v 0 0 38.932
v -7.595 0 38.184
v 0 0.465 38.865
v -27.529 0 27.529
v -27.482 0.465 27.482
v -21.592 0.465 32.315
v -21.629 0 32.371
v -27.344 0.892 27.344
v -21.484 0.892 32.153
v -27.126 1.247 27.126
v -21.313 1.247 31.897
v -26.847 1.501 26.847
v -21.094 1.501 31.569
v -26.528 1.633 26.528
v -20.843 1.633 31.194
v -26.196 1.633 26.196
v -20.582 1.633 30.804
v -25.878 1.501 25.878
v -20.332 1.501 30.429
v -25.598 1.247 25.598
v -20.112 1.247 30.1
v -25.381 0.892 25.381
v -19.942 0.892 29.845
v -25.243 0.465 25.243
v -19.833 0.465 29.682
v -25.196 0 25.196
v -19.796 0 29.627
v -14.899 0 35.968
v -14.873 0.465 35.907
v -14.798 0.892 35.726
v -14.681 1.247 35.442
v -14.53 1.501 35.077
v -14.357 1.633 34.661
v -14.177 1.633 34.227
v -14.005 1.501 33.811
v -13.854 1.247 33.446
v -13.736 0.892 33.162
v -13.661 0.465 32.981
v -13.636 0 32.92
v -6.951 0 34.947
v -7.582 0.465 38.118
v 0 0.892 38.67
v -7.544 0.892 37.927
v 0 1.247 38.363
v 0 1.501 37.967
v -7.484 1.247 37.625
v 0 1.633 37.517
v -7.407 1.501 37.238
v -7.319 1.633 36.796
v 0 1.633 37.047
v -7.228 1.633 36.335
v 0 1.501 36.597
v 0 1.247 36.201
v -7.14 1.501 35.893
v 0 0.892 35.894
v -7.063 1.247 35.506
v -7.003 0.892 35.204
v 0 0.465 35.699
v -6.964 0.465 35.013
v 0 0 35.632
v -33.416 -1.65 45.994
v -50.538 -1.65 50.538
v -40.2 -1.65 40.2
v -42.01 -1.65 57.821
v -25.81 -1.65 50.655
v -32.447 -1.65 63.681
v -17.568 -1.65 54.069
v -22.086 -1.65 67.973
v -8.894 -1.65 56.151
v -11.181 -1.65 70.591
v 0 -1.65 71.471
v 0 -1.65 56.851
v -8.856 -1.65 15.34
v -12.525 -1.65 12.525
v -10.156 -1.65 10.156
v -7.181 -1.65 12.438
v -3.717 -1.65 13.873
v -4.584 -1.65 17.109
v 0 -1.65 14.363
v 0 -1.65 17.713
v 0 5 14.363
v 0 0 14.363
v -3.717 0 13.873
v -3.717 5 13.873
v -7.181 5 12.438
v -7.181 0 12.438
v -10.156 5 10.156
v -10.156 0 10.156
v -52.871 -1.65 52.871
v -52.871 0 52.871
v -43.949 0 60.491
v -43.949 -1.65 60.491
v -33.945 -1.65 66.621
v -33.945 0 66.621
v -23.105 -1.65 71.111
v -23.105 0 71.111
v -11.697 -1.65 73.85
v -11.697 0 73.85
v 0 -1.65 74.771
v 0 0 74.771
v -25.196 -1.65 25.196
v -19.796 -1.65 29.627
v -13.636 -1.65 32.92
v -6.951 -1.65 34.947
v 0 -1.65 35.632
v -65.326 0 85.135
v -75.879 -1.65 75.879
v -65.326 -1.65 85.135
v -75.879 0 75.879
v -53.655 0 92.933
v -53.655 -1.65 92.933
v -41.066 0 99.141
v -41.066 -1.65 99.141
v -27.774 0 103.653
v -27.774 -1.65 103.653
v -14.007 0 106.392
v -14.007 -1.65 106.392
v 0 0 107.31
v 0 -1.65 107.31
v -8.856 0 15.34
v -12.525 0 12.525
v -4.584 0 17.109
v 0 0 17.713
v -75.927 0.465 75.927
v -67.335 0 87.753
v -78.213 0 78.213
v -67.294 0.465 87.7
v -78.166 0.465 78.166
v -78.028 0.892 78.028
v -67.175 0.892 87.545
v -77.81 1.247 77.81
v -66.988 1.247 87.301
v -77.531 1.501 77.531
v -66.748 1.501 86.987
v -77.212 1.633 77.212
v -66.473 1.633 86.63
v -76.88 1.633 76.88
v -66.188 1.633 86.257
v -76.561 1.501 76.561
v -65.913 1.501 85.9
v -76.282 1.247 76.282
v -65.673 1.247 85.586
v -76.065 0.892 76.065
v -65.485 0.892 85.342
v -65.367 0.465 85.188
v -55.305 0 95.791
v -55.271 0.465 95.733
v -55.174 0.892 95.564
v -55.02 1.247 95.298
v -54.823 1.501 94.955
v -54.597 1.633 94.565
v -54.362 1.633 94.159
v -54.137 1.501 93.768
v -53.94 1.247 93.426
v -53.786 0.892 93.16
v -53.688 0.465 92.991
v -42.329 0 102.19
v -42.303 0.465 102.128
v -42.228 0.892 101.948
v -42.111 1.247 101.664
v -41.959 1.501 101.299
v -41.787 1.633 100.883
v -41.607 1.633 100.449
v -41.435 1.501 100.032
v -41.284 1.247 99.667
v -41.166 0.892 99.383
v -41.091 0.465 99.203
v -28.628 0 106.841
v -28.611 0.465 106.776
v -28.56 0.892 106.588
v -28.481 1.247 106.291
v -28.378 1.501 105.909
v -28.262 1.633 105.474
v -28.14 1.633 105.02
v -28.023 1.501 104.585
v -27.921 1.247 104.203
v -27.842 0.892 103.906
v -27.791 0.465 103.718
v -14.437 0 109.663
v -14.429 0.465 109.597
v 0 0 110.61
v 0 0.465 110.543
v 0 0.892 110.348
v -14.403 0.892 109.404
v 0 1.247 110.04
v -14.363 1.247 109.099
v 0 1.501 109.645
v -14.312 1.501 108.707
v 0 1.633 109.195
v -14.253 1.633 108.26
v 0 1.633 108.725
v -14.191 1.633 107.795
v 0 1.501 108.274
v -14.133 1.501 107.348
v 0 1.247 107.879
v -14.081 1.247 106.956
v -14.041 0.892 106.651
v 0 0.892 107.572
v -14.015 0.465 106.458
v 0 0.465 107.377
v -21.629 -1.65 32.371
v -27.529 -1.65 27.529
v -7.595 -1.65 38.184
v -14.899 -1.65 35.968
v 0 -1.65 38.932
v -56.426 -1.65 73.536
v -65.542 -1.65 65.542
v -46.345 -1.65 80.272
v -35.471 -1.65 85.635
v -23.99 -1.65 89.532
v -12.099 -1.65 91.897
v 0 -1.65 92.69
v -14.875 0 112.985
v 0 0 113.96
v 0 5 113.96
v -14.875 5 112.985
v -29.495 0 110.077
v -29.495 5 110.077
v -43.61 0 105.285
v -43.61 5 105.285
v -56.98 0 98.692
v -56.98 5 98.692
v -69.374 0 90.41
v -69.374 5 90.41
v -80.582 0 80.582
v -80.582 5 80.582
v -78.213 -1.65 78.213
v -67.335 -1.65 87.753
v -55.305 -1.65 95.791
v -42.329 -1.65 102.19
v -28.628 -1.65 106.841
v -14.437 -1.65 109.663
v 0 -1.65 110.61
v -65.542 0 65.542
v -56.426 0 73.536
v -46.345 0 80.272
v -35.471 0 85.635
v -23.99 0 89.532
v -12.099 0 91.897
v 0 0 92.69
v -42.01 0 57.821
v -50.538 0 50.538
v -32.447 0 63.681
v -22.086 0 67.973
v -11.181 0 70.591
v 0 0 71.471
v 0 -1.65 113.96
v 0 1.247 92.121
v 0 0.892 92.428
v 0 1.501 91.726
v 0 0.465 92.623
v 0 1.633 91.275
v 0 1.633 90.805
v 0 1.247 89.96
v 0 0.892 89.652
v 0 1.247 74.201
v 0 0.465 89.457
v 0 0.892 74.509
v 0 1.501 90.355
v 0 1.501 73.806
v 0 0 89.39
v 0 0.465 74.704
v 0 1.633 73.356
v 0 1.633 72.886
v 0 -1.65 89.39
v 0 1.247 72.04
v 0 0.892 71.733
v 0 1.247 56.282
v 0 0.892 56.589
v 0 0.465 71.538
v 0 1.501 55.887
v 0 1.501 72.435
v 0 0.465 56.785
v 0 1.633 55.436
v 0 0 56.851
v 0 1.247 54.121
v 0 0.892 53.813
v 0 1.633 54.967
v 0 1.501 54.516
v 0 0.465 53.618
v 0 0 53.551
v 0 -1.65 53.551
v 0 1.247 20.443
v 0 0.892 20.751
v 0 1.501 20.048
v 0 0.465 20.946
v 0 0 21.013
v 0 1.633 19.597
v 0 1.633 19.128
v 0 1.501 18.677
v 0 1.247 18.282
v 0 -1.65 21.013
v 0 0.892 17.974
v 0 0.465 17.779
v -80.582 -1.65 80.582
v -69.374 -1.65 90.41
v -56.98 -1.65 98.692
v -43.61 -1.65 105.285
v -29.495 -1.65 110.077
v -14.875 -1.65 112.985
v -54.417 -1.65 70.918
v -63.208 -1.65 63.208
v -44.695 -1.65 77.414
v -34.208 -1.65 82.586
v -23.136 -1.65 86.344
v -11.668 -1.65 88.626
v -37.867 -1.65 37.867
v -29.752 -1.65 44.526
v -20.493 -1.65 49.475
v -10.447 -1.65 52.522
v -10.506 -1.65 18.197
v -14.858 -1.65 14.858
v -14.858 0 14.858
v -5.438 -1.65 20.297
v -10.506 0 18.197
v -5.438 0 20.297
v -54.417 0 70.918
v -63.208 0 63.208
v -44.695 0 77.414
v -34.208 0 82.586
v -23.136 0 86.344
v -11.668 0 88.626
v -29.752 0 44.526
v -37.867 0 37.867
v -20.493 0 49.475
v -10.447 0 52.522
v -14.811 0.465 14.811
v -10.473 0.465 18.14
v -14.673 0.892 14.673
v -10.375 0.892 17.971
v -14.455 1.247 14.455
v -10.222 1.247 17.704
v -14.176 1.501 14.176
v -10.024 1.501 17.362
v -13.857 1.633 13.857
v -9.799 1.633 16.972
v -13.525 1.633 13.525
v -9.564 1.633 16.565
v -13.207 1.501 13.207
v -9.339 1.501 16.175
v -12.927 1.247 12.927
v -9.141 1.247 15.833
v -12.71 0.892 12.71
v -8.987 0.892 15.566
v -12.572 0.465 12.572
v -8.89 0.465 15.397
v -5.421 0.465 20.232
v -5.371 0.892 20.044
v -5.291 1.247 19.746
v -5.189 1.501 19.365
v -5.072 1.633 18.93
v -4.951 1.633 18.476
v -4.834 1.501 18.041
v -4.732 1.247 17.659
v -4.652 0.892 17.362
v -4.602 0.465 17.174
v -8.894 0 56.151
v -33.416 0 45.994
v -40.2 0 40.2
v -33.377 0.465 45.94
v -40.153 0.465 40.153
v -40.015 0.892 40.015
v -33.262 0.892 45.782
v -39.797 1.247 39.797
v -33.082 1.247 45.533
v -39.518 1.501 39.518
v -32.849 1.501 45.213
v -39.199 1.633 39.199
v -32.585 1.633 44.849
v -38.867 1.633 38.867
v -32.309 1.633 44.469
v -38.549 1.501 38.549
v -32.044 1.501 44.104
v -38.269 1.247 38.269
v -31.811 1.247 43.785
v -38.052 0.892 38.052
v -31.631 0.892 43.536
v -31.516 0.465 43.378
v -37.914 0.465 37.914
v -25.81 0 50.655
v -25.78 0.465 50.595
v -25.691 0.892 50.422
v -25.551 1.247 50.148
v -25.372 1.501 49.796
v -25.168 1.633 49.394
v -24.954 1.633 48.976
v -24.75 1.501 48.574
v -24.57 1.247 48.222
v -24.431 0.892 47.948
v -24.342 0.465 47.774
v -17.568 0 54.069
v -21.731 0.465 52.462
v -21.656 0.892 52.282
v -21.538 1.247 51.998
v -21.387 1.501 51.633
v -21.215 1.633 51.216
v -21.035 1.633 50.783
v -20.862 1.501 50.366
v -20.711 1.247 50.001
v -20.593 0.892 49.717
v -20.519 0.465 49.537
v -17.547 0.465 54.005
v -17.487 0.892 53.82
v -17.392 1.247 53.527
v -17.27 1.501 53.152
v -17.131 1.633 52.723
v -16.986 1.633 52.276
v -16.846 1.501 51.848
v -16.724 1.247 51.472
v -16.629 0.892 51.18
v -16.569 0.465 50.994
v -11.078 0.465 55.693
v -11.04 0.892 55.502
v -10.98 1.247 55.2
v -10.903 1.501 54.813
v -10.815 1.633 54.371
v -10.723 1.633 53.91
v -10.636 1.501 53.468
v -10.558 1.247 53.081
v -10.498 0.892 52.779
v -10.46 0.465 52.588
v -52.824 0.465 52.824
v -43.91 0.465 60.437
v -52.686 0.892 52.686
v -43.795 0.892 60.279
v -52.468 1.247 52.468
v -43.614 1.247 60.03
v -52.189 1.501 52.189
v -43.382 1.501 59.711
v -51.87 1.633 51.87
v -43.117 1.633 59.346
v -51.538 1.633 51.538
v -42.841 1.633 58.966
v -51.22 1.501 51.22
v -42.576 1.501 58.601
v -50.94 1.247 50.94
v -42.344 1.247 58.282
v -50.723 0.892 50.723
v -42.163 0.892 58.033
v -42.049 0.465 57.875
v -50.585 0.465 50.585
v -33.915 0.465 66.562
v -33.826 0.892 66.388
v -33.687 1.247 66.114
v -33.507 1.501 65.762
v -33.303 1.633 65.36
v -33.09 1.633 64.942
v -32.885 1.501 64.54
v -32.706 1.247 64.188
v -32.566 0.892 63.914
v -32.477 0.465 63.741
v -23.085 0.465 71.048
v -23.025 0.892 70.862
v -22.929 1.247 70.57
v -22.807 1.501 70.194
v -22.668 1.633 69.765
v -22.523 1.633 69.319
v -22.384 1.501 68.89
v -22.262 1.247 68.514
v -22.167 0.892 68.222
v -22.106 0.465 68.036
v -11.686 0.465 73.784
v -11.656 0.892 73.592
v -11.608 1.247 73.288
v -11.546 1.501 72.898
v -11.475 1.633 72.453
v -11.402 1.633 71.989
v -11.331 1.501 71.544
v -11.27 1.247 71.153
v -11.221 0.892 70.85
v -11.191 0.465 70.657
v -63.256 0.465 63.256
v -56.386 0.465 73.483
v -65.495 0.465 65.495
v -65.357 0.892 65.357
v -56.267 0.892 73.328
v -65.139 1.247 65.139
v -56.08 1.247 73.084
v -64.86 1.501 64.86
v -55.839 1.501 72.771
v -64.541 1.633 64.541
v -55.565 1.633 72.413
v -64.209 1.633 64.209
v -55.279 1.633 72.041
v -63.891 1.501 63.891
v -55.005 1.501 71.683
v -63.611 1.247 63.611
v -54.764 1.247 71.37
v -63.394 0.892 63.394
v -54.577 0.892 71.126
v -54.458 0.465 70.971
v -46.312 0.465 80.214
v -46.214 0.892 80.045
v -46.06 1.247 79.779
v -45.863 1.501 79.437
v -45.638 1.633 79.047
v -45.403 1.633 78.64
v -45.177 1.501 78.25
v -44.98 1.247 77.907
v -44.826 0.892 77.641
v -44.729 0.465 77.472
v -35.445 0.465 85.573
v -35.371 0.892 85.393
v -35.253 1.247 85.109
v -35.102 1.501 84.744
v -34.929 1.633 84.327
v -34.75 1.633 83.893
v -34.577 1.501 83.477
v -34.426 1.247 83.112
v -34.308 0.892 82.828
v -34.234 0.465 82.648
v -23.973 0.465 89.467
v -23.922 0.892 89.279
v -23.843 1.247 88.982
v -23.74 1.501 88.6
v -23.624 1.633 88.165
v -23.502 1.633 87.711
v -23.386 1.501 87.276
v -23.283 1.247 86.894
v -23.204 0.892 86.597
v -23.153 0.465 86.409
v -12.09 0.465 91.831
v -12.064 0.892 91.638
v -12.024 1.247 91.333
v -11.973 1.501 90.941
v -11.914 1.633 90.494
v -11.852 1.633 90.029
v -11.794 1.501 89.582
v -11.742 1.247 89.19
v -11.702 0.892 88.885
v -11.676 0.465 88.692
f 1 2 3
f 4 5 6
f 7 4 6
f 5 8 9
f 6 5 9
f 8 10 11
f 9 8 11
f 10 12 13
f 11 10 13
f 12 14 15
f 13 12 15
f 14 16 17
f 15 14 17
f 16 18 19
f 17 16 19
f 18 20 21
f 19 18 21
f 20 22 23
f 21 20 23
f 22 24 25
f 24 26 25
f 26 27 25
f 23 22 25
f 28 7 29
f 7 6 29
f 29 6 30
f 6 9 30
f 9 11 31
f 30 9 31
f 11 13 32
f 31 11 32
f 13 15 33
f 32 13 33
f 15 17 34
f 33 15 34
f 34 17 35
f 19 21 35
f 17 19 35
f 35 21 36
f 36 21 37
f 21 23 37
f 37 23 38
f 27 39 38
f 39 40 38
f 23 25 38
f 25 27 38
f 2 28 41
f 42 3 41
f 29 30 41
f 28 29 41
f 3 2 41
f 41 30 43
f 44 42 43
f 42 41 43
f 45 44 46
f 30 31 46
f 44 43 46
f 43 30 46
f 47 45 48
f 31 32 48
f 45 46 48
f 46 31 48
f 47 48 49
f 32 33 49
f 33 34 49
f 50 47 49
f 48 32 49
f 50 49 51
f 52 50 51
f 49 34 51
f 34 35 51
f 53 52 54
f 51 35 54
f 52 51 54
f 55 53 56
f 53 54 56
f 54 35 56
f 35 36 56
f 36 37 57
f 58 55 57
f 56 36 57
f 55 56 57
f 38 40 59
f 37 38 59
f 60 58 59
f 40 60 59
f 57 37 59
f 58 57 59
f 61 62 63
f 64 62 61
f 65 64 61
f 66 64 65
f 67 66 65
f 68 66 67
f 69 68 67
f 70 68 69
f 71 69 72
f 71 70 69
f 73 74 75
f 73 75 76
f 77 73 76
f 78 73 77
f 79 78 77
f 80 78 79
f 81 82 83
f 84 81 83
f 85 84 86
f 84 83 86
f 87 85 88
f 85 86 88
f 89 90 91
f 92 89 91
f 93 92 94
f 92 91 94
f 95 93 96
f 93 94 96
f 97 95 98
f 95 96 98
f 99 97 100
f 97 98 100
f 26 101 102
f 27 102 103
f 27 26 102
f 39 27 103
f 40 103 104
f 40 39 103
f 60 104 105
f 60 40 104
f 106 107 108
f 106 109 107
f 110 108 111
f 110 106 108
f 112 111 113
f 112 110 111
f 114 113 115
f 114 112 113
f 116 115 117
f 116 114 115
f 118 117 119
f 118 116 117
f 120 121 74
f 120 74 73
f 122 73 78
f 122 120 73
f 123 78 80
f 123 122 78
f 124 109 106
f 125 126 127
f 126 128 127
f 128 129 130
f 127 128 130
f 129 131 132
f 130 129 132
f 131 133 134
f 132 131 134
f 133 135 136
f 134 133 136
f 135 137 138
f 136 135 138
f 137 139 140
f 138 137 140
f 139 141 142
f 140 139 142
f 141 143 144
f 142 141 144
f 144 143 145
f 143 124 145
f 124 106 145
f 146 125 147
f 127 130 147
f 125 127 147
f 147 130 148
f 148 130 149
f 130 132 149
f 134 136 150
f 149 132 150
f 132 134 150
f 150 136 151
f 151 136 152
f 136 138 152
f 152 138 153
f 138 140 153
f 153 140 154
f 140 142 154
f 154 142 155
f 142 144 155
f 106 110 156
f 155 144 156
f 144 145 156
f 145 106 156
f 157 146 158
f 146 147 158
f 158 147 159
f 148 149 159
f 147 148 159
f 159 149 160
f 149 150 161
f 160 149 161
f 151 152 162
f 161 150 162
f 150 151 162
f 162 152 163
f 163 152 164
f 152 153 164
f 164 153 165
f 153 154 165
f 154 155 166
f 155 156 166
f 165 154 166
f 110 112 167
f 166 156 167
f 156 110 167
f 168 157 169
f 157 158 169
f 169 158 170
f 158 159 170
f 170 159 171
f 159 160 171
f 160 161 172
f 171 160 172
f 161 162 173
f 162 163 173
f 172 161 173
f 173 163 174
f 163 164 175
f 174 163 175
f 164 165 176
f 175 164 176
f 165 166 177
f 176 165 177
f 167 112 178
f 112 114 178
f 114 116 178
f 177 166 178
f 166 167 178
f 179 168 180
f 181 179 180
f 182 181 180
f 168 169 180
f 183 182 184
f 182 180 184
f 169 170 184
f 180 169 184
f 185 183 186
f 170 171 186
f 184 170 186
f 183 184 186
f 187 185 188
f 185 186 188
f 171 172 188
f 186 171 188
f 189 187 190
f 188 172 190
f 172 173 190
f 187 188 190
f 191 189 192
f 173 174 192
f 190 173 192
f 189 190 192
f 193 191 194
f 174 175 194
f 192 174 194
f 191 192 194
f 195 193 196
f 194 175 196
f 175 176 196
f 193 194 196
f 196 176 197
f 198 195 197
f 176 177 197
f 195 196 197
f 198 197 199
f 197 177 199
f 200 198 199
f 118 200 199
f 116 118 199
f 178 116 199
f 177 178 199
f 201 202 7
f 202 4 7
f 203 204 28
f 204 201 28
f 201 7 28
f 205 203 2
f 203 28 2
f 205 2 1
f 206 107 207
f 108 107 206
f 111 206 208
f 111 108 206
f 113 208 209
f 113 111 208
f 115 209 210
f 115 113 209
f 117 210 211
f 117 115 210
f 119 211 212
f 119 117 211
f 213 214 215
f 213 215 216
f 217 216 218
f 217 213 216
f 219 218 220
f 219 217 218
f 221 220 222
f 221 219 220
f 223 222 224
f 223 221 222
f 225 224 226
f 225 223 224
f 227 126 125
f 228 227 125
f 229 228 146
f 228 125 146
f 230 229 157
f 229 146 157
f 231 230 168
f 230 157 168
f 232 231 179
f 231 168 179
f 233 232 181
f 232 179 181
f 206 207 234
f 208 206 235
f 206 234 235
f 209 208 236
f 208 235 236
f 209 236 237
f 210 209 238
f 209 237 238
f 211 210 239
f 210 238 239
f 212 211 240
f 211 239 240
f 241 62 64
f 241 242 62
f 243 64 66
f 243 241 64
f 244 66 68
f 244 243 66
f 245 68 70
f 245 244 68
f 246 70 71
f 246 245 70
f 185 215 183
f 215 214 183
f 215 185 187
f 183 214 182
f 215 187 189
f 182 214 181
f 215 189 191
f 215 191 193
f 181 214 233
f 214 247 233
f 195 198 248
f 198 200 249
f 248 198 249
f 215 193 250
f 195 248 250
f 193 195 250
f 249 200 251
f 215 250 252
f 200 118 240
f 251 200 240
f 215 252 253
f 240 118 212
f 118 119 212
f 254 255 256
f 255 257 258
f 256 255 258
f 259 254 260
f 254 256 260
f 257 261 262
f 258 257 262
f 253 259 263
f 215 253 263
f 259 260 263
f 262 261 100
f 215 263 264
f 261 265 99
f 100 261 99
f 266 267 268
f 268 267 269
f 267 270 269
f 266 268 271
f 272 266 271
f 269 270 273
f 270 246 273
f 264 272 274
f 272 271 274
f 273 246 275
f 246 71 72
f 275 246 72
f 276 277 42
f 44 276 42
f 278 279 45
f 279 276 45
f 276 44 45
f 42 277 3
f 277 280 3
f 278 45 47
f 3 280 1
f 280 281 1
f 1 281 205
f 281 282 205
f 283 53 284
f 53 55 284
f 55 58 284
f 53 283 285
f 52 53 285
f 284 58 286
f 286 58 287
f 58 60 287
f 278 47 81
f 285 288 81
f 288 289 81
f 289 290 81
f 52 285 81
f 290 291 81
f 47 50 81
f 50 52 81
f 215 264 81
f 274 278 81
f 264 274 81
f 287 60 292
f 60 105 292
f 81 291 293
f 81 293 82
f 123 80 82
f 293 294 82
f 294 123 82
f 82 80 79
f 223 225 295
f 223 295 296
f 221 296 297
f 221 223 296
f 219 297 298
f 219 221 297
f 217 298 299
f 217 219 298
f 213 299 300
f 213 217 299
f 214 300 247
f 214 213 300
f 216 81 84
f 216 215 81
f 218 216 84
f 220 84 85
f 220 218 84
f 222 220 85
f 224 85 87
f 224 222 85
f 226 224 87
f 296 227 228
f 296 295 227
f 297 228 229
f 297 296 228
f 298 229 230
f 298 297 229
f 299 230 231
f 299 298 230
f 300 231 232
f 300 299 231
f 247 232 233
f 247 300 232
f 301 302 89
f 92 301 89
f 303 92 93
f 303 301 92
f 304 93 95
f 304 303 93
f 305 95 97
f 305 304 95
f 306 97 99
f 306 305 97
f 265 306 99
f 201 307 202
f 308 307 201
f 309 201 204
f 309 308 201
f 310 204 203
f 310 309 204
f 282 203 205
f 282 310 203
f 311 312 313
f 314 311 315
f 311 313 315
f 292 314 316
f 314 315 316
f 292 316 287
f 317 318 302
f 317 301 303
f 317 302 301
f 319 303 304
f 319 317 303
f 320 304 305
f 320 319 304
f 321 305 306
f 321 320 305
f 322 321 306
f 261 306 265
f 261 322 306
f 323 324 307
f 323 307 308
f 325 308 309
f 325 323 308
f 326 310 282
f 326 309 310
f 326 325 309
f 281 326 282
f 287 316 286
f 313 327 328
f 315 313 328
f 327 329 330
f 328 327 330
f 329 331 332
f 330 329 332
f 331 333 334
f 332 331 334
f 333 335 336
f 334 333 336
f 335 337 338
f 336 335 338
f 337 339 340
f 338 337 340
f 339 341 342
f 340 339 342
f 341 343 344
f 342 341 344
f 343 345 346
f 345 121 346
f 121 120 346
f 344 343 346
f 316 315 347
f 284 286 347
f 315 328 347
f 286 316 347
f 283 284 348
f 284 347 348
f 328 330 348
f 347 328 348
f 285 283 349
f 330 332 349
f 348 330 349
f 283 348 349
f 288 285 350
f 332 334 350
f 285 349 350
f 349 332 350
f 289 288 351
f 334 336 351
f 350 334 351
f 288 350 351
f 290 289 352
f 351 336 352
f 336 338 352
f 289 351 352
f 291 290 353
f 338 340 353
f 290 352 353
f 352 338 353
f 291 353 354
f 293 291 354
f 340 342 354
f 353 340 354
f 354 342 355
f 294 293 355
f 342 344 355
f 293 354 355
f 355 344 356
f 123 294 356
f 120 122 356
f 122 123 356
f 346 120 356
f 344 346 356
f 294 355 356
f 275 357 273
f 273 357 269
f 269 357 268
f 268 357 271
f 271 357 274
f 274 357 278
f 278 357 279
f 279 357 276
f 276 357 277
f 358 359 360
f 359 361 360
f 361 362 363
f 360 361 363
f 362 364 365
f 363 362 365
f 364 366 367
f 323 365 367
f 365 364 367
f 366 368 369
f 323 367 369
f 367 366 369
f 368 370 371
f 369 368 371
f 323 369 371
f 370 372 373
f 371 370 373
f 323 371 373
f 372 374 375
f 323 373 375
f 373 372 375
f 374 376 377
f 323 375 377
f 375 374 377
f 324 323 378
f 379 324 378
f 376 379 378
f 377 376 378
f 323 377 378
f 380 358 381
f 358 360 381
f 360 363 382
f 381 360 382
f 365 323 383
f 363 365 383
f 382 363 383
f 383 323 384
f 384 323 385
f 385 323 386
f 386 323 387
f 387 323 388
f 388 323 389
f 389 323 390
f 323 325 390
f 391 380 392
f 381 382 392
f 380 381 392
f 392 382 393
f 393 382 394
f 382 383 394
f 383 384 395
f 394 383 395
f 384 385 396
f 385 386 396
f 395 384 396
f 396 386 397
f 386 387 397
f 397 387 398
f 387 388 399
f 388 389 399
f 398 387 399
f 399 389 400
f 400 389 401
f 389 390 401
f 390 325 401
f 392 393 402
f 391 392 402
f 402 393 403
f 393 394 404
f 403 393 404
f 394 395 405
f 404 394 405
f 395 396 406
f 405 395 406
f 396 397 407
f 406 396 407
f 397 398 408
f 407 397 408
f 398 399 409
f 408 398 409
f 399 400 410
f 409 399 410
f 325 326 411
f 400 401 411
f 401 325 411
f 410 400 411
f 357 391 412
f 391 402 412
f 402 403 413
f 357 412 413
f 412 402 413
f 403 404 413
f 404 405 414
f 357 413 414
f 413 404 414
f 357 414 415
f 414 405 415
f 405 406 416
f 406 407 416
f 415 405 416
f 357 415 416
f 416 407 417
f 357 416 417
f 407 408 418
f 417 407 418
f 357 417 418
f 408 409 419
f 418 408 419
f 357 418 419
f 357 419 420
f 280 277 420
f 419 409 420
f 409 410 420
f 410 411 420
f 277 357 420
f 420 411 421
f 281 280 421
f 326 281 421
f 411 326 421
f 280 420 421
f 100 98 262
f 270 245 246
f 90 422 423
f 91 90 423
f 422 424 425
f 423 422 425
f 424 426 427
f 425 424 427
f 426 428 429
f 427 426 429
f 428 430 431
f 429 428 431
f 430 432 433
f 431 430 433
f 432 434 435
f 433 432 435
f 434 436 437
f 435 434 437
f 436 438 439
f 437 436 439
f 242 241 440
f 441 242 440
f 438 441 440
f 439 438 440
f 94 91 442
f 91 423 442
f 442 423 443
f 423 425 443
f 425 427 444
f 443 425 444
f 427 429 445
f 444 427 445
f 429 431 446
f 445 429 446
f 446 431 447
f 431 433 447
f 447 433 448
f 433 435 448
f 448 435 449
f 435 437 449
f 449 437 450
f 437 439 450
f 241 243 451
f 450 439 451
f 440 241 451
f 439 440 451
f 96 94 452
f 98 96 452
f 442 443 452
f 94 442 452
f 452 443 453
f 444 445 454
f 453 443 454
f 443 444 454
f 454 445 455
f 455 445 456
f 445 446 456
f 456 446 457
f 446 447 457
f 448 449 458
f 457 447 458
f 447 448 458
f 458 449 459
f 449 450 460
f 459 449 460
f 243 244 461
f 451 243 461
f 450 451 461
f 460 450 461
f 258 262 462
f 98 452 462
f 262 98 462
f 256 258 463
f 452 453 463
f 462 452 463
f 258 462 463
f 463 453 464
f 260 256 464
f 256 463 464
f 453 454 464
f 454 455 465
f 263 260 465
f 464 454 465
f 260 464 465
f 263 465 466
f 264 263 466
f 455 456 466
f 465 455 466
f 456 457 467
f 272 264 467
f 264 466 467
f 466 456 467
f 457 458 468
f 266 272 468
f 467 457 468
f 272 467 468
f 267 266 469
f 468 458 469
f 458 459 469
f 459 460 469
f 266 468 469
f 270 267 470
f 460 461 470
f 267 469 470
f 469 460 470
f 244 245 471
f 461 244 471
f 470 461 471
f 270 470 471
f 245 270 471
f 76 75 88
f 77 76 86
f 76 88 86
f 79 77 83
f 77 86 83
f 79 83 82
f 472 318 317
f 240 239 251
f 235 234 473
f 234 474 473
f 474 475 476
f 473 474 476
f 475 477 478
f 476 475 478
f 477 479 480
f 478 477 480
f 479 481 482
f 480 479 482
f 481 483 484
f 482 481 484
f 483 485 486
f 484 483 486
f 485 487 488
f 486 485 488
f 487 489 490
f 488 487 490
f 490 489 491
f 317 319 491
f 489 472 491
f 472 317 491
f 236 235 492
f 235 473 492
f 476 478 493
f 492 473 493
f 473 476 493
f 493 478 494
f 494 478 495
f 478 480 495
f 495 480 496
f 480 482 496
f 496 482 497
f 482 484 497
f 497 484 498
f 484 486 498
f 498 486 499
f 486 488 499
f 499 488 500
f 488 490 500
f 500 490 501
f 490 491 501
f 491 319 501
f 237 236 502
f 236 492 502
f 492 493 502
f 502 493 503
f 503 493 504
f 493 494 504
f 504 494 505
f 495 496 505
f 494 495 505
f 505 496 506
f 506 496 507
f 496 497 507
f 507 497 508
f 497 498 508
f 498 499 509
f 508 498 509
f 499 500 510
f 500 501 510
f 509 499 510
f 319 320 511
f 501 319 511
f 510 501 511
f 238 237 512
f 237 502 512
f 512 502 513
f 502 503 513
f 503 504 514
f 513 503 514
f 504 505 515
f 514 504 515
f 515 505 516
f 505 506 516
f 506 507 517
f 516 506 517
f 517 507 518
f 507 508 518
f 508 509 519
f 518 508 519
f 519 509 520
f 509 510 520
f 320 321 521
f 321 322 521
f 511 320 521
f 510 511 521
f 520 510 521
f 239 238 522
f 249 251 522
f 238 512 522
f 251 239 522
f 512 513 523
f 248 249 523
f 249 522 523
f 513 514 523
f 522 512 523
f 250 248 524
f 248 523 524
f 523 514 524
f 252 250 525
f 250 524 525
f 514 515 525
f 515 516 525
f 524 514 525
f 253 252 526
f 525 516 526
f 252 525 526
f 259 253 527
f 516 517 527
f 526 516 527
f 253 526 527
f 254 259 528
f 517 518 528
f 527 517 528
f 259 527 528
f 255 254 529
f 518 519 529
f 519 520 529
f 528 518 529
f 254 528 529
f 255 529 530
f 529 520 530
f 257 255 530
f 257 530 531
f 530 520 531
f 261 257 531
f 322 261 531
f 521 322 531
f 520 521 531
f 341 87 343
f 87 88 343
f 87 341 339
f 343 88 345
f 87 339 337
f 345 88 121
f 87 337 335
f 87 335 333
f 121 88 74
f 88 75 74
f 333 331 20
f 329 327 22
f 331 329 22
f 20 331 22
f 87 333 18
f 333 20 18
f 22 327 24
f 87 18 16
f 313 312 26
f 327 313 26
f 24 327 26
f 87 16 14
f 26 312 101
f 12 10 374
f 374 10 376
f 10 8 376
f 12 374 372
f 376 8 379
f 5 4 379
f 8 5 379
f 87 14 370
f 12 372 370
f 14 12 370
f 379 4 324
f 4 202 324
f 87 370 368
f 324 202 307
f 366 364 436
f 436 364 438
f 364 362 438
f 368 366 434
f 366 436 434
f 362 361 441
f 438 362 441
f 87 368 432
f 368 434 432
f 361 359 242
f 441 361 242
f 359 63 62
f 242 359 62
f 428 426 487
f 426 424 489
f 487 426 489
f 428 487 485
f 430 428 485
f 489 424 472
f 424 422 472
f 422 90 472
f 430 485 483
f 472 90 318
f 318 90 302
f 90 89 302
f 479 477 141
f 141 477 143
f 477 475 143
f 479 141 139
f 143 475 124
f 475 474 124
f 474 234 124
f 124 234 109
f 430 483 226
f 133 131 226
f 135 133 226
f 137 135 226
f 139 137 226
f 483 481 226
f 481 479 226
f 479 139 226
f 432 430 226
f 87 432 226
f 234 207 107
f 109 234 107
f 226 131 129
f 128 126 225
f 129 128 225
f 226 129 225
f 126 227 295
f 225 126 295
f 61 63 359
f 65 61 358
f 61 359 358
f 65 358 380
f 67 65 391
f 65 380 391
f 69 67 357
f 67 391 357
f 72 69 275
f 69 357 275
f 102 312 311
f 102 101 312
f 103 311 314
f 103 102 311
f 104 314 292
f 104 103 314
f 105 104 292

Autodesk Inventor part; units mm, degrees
ref_plane "YZ Plane" through (0, 0, 0) normal (1, 0, 0) x (0, 1, 0)
ref_plane "XZ Plane" through (0, 0, 0) normal (0, 1, 0) x (-1, 0, 0)
ref_plane "XY Plane" through (0, 0, 0) normal (0, 0, 1) x (1, 0, 0)
sketch "Sketch1" plane through (0, 0, 0) normal (0, 1, 0) x (-1, 0, 0)
  arc A0 (77.046154, 77.046154) -> (0, 108.959716) centre (0, 0) ccw
  arc A1 (64.375202, 64.375202) -> (0, 91.040284) centre (0, 0) ccw
  line L0 (0, 113.959716) -> (0, 0)
  arc A2 (51.70425, 51.70425) -> (0, 73.120851) centre (0, 0) ccw
  arc A3 (39.033297, 39.033297) -> (0, 55.201418) centre (0, 0) ccw
  arc A4 (26.362345, 26.362345) -> (0, 37.281986) centre (0, 0) ccw
  arc A5 (70.710678, 70.710678) -> (0, 100) centre (0, 0) ccw construction
  arc A6 (13.691392, 13.691392) -> (0, 19.362553) centre (0, 0) ccw
  line L1 (0, 0) -> (80.581688, 80.581688)
  arc A7 (80.581688, 80.581688) -> (0, 113.959716) centre (0, 0) ccw
  arc A8 (10.155859, 10.155859) -> (0, 14.362553) centre (0, 0) ccw
  dimension "d8" = 45
  dimension "d0" = 17.91943
  dimension "d2" = 8.95972
  dimension "d3" = 200
  dimension "d4" = 17.91943
  dimension "d5" = 17.91943
  dimension "d6" = 17.91943
  dimension "d9" = 17.91943
  dimension "d10" = 5
  dimension "d11" = 5
extrude "Extrusion1" add sketch "Sketch1" along normal blind 5 contours L1 A1 L0 A0 | A0 L0 A7 L1 | L1 A2 L0 A1 | L1 A3 L0 A2 | L1 A4 L0 A3 | L1 A6 L0 A4 | L1 A8 L0 A6
sketch "Sketch2" plane through (-80.581688, 0, 80.581688) normal (-0.7071068, 0, -0.7071068) x (-0.7071068, 0, 0.7071068)
  line L0 (-5, 0) -> (-36.913562, 0)
  line L1 (-22.919433, 0) -> (-49.584514, 0)
  line L2 (-40.838865, 0) -> (-62.255467, 0)
  line L3 (-58.758298, 0) -> (-74.926419, 0)
  line L4 (-76.677731, 0) -> (-87.597372, 0)
  line L5 (-94.597164, 0) -> (-100.268324, 0)
  circle A0 centre (-5, 0) radius 1.65
  circle A1 centre (-22.919433, 0) radius 1.65
  circle A2 centre (-40.838865, 0) radius 1.65
  circle A3 centre (-58.758298, 0) radius 1.65
  circle A4 centre (-76.677731, 0) radius 1.65
  circle A5 centre (-94.597164, 0) radius 1.65
  point P0 (-113.959716, 0)
  dimension "d14" = 3.3
sweep "Sweep1" cut profiles "Sketch2" path "Sketch1" path curves A0 contours A0
sweep "Sweep2" cut profiles "Sketch2" path "Sketch1" path curves A1 contours A1 L0 | L0 A1
sweep "Sweep3" cut profiles "Sketch2" path "Sketch1" path curves A2 contours A2 L1 | L1 A2
sweep "Sweep4" cut profiles "Sketch2" path "Sketch1" path curves A3 contours A3 L2 | L2 A3
sweep "Sweep5" cut profiles "Sketch2" path "Sketch1" path curves A4 contours A4
sweep "Sweep6" cut profiles "Sketch2" path "Sketch1" path curves A6 contours A5
sketch "Sketch3" plane through (0, 0, 0) normal (0, -1, 0) x (1, 0, 0)
  arc A0 (0, 110.609716) -> (-78.21288, 78.21288) centre (0, 0) ccw
  line L0 (0, 113.959716) -> (0, 110.609716)
  arc A1 (0, 113.959716) -> (-80.581688, 80.581688) centre (0, 0) ccw
  line L1 (-78.21288, 78.21288) -> (-80.581688, 80.581688)
  arc A2 (0, 92.690284) -> (-65.541928, 65.541928) centre (0, 0) ccw
  line L2 (0, 107.309716) -> (0, 92.690284)
  arc A3 (0, 107.309716) -> (-75.879428, 75.879428) centre (0, 0) ccw
  line L3 (-65.541928, 65.541928) -> (-75.879428, 75.879428)
  arc A4 (0, 74.770851) -> (-52.870976, 52.870976) centre (0, 0) ccw
  line L4 (0, 89.390284) -> (0, 74.770851)
  arc A5 (0, 89.390284) -> (-63.208476, 63.208476) centre (0, 0) ccw
  line L5 (-52.870976, 52.870976) -> (-63.208476, 63.208476)
  arc A6 (0, 56.851418) -> (-40.200023, 40.200023) centre (0, 0) ccw
  line L6 (0, 71.470851) -> (0, 56.851418)
  arc A7 (0, 71.470851) -> (-50.537523, 50.537523) centre (0, 0) ccw
  line L7 (-40.200023, 40.200023) -> (-50.537523, 50.537523)
  arc A8 (0, 38.931986) -> (-27.529071, 27.529071) centre (0, 0) ccw
  line L8 (0, 53.551418) -> (0, 38.931986)
  arc A9 (0, 53.551418) -> (-37.866571, 37.866571) centre (0, 0) ccw
  line L9 (-27.529071, 27.529071) -> (-37.866571, 37.866571)
  arc A10 (0, 21.012553) -> (-14.858119, 14.858119) centre (0, 0) ccw
  line L10 (0, 35.631986) -> (0, 21.012553)
  arc A11 (0, 35.631986) -> (-25.195619, 25.195619) centre (0, 0) ccw
  line L11 (-14.858119, 14.858119) -> (-25.195619, 25.195619)
  arc A12 (0, 17.712553) -> (-12.524666, 12.524666) centre (0, 0) ccw
  line L12 (-10.155859, 10.155859) -> (-12.524666, 12.524666)
  arc A13 (0, 14.362553) -> (-10.155859, 10.155859) centre (0, 0) ccw
  line L13 (0, 17.712553) -> (0, 14.362553)
extrude "Extrusion2" add sketch "Sketch3" along normal blind 1.65
equation "\"d0\" = d25"
equation "\"d2\" = 0.5 * d25"
equation "\"d4\" = d25"
equation "\"d5\" = d4"
equation "\"d6\" = d5"
equation "\"d9\" = d6"
equation "\"d14\" = trackDiameter"
equation "\"d28\" = 0.5 * trackDiameter"
equation "\"d25\" = 17.919433"
equation "\"trackDiameter\" = 3.3"
properties part number "Curved Track Builder"
